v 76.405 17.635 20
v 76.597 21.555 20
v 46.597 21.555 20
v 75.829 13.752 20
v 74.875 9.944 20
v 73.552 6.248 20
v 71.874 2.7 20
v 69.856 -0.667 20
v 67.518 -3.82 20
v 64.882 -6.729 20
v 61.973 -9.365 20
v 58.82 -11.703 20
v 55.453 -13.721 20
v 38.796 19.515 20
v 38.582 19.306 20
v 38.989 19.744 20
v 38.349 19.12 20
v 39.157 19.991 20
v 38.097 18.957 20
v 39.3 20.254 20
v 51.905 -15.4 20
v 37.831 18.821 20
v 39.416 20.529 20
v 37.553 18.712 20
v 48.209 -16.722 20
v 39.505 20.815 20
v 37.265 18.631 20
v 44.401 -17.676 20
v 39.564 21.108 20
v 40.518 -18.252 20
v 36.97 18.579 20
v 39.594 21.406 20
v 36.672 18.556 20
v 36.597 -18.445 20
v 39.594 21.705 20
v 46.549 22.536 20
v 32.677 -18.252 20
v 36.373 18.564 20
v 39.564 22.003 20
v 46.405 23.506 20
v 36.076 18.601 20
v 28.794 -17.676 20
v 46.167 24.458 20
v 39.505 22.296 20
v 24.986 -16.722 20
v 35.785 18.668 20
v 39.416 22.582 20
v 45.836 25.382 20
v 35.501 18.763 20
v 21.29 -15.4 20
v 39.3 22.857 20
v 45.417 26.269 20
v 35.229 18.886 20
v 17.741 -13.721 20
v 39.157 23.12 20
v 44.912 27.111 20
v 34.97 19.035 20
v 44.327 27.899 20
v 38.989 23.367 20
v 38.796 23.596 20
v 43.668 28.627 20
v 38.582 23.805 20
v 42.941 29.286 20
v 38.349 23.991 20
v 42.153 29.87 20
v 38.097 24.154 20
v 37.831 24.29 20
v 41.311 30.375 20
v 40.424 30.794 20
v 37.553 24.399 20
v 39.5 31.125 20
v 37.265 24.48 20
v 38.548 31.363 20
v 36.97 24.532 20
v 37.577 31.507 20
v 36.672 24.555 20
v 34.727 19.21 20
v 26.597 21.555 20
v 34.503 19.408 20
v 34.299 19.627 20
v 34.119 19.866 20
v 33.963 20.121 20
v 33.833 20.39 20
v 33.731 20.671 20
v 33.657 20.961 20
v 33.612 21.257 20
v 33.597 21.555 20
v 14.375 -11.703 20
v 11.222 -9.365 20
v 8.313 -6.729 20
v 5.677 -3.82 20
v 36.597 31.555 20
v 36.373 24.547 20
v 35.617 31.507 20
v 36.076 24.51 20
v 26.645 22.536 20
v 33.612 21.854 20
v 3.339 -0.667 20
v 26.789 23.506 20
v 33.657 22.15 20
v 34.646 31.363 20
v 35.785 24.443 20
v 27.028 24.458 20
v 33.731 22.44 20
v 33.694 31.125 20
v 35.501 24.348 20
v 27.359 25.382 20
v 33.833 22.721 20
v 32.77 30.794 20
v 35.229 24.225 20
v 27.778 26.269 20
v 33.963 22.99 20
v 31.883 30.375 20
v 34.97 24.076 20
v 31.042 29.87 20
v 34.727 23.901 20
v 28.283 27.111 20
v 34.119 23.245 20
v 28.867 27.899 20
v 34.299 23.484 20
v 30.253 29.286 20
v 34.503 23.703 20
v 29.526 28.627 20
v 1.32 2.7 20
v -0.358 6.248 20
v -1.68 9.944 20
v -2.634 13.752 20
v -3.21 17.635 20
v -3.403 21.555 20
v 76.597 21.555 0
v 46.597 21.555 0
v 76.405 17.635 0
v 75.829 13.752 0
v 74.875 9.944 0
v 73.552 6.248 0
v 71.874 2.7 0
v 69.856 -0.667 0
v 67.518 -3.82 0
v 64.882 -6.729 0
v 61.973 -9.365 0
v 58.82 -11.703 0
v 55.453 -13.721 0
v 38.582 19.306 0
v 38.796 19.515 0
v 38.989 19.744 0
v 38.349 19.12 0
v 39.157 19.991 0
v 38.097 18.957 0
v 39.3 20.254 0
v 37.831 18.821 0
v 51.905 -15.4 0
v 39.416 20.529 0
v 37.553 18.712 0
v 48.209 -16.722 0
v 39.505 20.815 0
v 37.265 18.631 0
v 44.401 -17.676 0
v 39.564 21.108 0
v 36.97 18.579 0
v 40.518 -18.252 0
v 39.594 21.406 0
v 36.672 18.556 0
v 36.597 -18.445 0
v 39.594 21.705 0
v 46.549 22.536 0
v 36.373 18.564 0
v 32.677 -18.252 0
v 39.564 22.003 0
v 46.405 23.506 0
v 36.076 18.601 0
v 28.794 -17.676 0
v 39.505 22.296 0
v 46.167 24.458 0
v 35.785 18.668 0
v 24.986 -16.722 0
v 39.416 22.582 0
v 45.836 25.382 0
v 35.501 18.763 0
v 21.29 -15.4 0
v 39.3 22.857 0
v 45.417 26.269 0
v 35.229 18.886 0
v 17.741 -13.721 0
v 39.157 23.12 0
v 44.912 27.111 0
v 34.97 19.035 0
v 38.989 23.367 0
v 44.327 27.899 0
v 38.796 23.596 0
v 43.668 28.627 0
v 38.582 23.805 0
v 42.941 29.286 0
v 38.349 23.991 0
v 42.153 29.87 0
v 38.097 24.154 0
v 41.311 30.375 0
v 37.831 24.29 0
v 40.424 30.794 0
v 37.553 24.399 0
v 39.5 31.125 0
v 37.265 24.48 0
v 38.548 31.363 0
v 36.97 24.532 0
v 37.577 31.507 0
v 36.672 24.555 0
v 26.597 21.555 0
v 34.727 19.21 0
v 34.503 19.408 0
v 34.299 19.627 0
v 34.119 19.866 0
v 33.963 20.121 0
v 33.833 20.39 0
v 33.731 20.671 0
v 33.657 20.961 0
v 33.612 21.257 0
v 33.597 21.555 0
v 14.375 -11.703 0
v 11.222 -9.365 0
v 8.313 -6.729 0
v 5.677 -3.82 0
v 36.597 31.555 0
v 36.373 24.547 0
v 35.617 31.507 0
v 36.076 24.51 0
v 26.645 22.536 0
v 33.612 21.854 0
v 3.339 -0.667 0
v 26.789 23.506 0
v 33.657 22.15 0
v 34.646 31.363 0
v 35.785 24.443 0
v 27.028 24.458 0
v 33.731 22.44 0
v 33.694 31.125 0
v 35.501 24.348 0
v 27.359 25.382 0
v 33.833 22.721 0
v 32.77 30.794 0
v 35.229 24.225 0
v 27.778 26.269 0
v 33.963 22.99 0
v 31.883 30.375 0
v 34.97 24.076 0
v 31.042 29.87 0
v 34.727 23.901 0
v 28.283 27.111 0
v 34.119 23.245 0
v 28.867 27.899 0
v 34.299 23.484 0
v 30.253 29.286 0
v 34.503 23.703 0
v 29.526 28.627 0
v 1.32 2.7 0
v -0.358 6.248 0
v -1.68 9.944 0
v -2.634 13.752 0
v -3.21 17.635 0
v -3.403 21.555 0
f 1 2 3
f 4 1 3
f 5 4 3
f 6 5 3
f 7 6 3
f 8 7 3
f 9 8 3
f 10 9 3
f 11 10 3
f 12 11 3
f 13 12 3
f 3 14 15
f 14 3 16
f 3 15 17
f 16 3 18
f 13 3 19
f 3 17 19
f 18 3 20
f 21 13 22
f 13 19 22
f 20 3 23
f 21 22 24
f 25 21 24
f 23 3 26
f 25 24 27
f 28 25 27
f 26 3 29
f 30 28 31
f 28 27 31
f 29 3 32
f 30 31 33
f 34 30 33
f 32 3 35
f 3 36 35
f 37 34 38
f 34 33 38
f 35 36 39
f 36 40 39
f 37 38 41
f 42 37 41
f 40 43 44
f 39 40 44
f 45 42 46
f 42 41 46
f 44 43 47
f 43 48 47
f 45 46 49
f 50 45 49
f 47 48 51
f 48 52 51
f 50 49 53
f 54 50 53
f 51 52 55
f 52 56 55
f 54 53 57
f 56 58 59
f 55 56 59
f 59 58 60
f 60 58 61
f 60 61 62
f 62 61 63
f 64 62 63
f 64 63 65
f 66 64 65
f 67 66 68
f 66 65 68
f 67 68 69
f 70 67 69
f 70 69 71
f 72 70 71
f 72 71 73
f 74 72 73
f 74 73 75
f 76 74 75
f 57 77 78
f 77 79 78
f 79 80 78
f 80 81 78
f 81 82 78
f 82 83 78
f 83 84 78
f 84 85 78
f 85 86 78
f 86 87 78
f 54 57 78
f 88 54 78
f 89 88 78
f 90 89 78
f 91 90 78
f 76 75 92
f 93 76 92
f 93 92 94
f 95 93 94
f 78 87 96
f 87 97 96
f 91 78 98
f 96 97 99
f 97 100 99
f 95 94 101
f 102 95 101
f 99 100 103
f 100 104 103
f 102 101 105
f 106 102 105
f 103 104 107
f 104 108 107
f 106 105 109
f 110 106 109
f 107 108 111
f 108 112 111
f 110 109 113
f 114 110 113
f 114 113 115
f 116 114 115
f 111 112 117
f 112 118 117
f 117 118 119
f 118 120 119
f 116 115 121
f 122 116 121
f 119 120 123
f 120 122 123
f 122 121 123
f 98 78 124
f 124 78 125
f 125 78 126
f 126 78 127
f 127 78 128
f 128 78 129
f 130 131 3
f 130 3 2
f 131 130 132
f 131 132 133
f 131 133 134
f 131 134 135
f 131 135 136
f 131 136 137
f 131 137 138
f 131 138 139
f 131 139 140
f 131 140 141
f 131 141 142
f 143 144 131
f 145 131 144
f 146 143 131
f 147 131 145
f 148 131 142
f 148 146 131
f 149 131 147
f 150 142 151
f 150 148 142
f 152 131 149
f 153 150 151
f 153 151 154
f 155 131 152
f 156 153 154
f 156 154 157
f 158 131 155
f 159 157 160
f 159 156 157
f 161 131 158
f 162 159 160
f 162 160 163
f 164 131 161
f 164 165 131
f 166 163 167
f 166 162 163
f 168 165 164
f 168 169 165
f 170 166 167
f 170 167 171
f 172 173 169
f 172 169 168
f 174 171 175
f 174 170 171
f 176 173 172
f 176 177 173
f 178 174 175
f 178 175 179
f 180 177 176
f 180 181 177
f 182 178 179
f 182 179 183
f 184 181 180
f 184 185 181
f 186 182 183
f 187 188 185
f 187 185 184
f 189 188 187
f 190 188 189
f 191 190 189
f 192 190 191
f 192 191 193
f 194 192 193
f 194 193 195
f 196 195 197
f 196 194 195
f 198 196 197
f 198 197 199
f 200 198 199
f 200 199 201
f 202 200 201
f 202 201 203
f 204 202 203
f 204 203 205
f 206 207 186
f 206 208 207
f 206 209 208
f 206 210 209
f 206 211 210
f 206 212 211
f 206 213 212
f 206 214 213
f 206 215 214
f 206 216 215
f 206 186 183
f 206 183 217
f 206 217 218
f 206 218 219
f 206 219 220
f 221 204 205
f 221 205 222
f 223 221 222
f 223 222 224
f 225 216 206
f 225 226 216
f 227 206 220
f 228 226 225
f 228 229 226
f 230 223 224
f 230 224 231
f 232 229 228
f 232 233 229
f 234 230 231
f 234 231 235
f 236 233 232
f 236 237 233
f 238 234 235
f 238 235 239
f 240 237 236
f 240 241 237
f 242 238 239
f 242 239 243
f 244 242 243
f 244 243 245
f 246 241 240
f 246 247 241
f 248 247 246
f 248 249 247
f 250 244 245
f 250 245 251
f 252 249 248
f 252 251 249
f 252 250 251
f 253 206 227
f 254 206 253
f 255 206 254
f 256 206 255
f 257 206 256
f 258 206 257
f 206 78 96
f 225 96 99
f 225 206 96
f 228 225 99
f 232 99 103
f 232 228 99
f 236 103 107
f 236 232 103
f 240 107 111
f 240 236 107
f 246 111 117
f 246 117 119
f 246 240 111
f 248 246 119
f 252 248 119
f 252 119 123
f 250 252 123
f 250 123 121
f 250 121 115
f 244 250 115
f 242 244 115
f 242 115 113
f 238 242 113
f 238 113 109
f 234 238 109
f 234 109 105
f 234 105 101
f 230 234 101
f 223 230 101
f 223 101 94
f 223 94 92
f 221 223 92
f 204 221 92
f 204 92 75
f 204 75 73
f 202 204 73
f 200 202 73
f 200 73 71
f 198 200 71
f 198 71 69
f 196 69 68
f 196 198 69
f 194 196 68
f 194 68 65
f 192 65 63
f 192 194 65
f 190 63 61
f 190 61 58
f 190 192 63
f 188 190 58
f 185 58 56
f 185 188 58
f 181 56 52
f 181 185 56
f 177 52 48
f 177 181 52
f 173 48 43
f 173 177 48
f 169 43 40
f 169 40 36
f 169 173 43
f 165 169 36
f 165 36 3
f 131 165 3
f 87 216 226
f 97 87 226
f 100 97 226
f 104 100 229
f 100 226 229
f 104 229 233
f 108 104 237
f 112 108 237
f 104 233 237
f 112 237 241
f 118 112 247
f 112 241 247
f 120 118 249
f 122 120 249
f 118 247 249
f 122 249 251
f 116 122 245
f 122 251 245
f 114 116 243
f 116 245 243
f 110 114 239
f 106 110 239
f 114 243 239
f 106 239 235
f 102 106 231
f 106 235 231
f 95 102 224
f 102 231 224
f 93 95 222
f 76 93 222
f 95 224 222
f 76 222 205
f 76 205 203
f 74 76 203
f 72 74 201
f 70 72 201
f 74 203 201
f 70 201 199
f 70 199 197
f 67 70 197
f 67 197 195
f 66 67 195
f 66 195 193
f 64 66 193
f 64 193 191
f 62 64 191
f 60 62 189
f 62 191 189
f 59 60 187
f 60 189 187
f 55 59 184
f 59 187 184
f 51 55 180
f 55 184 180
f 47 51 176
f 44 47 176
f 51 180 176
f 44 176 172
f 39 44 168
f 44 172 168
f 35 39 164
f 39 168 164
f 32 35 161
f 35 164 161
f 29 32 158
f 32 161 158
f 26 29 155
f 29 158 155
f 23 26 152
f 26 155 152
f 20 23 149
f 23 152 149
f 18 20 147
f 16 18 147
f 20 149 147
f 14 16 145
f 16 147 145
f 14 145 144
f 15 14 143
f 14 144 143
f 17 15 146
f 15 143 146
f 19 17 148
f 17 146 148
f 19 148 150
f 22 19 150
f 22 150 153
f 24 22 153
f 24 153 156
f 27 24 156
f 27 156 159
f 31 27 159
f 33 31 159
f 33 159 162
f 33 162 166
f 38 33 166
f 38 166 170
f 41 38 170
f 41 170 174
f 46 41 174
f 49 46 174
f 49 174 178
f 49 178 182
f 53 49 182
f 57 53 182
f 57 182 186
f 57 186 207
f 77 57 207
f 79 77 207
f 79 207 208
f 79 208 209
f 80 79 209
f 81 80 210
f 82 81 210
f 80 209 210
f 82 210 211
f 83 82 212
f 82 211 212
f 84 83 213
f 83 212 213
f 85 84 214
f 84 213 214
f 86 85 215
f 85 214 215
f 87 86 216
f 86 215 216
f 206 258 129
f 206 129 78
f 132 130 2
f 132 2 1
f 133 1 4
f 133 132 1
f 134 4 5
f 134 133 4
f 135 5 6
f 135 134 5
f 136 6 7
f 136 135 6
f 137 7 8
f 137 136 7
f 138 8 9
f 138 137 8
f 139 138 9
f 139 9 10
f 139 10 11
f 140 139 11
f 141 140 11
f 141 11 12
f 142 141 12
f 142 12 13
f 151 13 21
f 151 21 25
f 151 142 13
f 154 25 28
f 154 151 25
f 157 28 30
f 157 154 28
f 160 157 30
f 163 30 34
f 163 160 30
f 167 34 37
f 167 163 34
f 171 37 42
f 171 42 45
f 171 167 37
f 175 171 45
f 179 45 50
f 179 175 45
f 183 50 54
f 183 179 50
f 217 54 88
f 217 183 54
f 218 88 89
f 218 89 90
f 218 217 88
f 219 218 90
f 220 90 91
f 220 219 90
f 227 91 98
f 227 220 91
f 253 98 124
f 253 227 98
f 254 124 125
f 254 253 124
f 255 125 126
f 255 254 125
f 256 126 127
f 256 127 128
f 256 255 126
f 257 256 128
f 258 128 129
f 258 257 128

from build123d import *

# Parameters (mm, degrees)
BOSS_EXTRUDE1_DEPTH = 20
SKETCH2_R           = 10
BOSS_EXTRUDE2_DEPTH = 20
SKETCH3_R           = 3
CUT_EXTRUDE1_DEPTH  = 20


with BuildPart() as part:
    # Sketch1 → Boss-Extrude1 (new body)
    with BuildSketch(Plane.XY):
        with BuildLine():
            Line((-3.402685511, 21.555471253), (76.597314489, 21.555471253))
            ThreePointArc((76.597314489, 21.555471253), (36.597314489, -18.444528747), (-3.402685511, 21.555471253))
        make_face()
    extrude(amount=BOSS_EXTRUDE1_DEPTH)

    # Sketch2 → Boss-Extrude2 (add)
    with BuildSketch(Plane(origin=(0, 0, 0), x_dir=(-1, 0, 0), z_dir=(0, 0, -1))):
        with Locations((-36.597314489, 21.555471253)):
            Circle(SKETCH2_R)
    extrude(amount=-BOSS_EXTRUDE2_DEPTH)

    # Sketch3 → Cut-Extrude1 (cut)
    with BuildSketch(Plane(origin=(0, 0, 0), x_dir=(-1, 0, 0), z_dir=(0, 0, -1))):
        with Locations((-36.597314489, 21.555471253)):
            Circle(SKETCH3_R)
    extrude(amount=-CUT_EXTRUDE1_DEPTH, mode=Mode.SUBTRACT)


solid = part.part
